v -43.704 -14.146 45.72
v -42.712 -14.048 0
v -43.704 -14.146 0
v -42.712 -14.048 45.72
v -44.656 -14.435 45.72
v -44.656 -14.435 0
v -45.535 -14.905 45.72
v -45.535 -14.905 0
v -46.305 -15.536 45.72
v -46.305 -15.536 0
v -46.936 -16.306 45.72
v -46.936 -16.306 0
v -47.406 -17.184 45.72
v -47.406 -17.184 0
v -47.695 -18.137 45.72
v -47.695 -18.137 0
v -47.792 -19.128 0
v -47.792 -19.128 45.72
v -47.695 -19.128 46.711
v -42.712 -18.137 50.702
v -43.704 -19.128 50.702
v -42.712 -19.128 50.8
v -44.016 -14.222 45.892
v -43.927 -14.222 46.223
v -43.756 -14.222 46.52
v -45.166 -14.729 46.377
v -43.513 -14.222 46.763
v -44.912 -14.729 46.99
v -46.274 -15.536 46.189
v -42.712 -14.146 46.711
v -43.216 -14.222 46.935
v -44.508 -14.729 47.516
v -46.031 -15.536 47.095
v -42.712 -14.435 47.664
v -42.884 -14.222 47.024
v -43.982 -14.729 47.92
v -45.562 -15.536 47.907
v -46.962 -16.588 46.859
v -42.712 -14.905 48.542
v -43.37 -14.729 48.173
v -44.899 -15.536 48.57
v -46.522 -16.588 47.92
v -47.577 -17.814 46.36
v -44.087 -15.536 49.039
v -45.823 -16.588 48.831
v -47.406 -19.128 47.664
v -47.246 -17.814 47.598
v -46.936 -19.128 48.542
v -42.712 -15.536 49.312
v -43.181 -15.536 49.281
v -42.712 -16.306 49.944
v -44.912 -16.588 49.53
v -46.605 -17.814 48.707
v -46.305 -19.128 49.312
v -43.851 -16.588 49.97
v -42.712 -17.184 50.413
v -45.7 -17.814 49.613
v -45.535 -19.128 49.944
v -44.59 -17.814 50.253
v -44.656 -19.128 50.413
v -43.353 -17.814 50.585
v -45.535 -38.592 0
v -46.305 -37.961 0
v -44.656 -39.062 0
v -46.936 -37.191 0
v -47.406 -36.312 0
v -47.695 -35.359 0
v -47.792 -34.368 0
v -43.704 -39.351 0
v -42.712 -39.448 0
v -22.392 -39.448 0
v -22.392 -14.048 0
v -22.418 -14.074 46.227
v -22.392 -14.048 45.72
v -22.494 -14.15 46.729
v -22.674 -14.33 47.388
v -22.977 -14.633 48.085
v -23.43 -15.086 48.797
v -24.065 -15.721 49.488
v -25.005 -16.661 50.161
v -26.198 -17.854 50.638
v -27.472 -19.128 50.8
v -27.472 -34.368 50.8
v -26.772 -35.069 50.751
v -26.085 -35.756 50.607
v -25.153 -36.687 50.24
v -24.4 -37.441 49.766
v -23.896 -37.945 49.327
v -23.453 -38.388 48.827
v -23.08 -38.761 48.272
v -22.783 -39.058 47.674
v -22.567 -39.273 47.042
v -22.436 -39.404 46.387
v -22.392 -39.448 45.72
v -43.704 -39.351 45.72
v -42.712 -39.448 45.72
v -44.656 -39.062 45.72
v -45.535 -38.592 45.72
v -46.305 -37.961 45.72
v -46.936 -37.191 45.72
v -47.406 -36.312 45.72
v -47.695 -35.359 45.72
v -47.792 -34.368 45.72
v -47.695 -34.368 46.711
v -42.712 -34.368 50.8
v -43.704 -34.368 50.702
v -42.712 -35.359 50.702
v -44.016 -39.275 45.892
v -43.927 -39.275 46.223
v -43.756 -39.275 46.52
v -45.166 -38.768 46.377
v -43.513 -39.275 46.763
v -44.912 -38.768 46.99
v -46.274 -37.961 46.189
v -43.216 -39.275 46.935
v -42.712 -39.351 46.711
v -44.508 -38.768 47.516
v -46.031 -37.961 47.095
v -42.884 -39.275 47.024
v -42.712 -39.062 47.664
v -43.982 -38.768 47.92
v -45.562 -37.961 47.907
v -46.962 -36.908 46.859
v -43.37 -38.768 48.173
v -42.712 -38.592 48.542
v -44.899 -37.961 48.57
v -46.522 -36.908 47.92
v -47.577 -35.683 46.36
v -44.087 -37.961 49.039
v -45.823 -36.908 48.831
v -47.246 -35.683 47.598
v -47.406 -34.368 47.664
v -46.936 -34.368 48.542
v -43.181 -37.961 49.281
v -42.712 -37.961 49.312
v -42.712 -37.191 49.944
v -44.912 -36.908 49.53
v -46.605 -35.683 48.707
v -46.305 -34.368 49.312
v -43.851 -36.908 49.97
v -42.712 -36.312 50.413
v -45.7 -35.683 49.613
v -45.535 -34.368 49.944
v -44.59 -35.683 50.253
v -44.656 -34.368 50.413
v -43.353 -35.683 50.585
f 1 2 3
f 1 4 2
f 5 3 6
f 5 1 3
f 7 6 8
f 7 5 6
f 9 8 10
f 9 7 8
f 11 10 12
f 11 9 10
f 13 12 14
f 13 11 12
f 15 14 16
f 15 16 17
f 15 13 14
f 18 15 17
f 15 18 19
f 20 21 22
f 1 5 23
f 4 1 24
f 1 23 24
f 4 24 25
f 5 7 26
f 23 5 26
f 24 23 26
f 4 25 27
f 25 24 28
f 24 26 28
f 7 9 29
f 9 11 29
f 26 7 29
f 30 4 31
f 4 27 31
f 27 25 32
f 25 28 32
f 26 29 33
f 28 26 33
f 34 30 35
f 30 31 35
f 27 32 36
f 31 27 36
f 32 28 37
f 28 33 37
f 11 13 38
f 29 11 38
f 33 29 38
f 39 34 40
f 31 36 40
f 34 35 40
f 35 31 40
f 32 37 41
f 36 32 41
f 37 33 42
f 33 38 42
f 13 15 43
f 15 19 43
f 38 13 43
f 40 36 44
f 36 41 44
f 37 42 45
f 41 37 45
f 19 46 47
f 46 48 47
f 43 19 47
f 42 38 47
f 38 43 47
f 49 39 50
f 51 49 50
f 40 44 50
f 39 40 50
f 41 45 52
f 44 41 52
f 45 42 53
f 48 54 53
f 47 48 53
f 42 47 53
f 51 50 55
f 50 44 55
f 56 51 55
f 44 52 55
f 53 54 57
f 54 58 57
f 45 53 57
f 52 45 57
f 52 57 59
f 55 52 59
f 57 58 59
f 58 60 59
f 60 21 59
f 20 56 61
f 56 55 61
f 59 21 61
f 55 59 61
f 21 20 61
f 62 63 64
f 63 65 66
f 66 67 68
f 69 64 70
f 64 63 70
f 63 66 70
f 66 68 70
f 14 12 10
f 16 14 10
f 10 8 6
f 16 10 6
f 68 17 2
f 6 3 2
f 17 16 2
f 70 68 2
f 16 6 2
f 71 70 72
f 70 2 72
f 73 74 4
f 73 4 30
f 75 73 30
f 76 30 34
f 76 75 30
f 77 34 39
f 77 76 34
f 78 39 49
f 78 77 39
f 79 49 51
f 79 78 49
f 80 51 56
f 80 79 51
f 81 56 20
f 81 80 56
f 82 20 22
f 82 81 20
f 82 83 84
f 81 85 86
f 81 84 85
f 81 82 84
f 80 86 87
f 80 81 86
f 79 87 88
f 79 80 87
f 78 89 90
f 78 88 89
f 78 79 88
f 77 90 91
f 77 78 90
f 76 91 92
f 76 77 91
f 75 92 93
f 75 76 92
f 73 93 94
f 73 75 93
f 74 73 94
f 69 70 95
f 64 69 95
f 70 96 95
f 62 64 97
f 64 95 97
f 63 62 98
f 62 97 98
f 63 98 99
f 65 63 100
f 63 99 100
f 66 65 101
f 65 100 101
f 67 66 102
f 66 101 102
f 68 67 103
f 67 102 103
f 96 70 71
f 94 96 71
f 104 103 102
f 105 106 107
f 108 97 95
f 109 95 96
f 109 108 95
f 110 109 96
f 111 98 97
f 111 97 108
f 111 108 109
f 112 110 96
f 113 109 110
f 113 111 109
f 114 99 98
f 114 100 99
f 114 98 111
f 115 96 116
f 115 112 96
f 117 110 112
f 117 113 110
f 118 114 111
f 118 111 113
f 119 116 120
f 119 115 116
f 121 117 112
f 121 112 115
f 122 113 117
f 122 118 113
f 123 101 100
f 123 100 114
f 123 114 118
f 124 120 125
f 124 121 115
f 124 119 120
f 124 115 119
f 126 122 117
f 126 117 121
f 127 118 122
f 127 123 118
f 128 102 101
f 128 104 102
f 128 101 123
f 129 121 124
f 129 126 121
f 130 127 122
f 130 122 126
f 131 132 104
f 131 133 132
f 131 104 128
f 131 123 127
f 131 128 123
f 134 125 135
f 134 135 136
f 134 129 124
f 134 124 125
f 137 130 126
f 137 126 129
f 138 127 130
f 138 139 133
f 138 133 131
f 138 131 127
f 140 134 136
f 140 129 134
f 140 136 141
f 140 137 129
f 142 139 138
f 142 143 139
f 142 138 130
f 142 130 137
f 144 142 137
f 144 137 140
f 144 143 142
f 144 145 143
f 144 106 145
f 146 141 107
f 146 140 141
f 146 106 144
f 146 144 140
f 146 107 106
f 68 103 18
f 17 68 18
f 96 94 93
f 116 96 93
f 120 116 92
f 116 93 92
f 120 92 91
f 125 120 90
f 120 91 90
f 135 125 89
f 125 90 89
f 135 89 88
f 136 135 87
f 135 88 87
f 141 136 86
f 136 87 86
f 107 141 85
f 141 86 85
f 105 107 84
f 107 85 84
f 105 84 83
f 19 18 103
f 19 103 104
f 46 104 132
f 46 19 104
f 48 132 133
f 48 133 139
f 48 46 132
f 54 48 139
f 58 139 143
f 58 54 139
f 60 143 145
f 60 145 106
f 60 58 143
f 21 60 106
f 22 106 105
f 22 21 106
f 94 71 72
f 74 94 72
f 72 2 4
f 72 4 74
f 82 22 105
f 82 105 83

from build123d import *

# Parameters (mm, degrees)
F0_W     = 25.4
F0_H     = 25.4
F1_DEPTH = 50.8
F2_R     = 5.08
F3_R     = 5.08


with BuildPart() as f1:
    # F0 (on Top) → F1 (new body)
    with BuildSketch(Plane.XY):
        with Locations((-35.092446, -26.748407)):
            Rectangle(F0_W, F0_H)
    extrude(amount=F1_DEPTH)

    # F2
    f2_edges = [f1.edges().sort_by_distance(p)[0] for p in [
        (-47.792446, -26.748407, 50.8),
    ]]
    fillet(f2_edges, radius=F2_R)

    # F3
    f3_edges = [f1.edges().sort_by_distance(p)[0] for p in [
        (-32.552446, -39.448407, 50.8),
        (-22.392446, -26.748407, 50.8),
        (-32.552446, -14.048407, 50.8),
    ]]
    fillet(f3_edges, radius=F3_R)


solid = f1.part
